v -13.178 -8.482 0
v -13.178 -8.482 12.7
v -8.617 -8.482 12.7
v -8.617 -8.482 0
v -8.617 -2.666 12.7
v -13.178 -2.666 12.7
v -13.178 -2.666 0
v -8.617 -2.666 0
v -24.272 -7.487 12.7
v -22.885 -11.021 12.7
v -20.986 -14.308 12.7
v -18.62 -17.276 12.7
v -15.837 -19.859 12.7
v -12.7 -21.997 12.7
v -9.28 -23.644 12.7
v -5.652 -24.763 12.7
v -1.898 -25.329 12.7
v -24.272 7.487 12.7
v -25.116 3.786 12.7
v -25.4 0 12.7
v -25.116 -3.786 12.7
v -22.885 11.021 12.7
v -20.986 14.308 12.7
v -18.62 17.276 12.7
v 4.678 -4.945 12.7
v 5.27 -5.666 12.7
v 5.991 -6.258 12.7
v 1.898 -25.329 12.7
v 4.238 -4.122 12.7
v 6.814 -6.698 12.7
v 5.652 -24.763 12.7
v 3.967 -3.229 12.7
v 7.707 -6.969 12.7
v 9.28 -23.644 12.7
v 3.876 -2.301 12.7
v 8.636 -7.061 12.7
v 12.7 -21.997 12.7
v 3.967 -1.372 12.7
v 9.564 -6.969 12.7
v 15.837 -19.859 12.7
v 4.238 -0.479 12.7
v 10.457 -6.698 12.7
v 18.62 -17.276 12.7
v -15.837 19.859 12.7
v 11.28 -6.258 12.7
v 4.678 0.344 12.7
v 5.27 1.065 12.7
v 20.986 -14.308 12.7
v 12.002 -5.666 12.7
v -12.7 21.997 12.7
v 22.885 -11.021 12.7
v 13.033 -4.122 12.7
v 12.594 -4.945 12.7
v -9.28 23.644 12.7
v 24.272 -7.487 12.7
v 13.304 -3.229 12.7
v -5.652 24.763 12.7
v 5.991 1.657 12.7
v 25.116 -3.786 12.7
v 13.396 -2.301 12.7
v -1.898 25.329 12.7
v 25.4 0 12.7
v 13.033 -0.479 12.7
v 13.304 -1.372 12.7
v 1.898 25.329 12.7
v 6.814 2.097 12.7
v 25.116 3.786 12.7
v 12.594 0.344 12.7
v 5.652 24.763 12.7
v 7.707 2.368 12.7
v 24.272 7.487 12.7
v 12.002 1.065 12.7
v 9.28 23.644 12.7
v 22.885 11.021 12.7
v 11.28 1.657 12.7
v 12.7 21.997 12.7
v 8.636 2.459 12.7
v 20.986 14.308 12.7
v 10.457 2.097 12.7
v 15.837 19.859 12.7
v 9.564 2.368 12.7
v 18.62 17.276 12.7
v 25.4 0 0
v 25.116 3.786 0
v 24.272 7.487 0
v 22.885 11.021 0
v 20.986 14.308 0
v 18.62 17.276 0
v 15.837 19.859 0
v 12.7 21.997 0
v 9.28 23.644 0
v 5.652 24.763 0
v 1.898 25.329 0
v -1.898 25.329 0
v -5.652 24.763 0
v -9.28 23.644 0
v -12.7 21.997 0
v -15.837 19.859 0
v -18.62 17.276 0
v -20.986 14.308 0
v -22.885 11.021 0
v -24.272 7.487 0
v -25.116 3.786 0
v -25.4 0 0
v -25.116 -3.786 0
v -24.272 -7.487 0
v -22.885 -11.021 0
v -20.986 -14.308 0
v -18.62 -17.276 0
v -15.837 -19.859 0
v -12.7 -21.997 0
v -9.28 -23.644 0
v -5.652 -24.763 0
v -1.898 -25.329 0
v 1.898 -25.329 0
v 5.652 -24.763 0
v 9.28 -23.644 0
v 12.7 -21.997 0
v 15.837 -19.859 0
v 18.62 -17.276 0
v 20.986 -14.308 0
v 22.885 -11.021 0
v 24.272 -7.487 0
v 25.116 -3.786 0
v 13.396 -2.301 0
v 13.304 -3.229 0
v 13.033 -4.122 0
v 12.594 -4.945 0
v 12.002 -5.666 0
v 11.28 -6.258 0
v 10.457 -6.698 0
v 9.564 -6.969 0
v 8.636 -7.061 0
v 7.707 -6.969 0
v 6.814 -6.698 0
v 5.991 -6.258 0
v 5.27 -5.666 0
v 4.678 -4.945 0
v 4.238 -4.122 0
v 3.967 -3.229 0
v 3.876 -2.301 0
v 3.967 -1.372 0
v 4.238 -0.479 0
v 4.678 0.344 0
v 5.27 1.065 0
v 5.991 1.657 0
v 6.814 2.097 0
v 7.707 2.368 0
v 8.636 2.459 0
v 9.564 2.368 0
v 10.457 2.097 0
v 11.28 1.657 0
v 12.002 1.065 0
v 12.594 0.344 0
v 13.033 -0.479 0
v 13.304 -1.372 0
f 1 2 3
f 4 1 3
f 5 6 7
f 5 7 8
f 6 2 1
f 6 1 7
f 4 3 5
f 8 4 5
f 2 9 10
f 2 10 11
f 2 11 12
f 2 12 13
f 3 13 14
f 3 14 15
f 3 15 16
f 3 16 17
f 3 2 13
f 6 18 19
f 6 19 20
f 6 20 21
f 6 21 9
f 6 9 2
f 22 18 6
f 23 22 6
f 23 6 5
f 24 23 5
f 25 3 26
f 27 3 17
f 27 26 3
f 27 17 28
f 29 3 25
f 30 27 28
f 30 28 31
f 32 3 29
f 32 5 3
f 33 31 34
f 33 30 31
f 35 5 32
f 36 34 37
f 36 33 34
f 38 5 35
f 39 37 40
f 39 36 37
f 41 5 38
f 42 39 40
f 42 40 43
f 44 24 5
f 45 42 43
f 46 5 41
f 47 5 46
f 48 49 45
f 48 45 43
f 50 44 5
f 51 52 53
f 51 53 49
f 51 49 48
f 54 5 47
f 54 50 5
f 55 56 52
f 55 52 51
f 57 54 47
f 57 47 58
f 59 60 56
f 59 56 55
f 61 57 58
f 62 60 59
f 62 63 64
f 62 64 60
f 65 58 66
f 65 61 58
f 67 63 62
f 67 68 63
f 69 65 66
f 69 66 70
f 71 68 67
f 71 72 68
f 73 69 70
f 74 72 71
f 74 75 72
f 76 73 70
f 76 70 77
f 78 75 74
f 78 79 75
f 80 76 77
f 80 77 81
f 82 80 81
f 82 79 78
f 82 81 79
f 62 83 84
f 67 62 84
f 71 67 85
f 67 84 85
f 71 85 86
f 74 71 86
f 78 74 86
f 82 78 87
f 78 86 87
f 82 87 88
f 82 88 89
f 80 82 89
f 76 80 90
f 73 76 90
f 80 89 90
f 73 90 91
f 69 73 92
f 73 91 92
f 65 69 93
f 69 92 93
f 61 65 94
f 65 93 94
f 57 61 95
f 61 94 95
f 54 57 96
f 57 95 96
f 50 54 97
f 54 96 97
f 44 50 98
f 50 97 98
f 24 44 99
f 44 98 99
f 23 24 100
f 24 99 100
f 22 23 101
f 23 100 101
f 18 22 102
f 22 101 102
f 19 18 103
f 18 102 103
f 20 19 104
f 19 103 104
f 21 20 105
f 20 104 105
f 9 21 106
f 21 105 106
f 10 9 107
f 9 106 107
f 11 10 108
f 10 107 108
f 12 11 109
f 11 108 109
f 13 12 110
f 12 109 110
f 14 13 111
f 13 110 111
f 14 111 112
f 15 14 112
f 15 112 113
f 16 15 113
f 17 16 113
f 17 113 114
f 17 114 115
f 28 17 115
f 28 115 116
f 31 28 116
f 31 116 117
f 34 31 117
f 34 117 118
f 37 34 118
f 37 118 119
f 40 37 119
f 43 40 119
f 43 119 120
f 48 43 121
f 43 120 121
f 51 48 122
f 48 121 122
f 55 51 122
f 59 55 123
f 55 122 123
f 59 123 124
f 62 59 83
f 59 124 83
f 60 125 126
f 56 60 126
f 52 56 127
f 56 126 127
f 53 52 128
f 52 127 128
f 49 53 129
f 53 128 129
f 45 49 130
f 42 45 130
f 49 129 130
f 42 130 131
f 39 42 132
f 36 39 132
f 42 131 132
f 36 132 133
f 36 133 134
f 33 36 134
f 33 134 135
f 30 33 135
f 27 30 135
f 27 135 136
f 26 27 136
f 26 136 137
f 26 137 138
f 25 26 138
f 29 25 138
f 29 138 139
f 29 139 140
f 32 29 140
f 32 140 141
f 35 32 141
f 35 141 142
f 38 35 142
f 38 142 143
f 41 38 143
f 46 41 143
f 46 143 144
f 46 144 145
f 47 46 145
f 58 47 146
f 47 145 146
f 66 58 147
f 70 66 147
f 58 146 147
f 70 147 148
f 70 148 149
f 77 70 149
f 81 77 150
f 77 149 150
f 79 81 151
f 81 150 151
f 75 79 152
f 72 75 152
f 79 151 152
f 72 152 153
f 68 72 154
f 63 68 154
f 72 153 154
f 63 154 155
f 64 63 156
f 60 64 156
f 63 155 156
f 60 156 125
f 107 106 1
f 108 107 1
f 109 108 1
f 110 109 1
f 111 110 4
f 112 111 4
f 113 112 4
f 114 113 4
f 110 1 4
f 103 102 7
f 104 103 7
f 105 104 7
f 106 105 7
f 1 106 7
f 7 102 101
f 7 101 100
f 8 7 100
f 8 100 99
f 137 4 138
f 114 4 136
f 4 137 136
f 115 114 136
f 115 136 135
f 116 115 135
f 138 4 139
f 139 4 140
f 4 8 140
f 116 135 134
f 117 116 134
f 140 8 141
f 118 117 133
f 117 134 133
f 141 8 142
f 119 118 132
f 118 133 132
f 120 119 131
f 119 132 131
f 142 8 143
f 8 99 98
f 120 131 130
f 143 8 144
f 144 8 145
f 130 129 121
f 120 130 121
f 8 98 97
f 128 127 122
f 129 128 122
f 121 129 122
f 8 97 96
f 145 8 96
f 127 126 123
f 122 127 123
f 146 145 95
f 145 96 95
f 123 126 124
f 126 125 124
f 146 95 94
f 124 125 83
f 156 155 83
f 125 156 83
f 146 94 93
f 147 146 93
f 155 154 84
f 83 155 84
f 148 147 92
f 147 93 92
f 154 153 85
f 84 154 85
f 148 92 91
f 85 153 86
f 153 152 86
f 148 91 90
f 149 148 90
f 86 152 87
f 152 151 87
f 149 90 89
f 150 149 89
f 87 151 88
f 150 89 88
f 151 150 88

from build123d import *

# Parameters (mm, degrees)
F0_R     = 25.4
F1_DEPTH = 12.7
F2_W     = 4.56177
F2_H     = 5.815812
F3_DEPTH = 12.701
F4_R     = 4.759949
F5_DEPTH = 12.701


with BuildPart() as f1:
    # F0 (on Top) → F1 (new body)
    with BuildSketch(Plane.XY):
        Circle(F0_R)
    extrude(amount=F1_DEPTH)

    # F2 (on face) → F3 (cut, through all)
    with BuildSketch(Plane.XY.offset(12.7)):
        with Locations((-10.897615, -5.573769)):
            Rectangle(F2_W, F2_H)
    extrude(amount=-F3_DEPTH, mode=Mode.SUBTRACT)

    # F4 (on face) → F5 (cut, through all)
    with BuildSketch(Plane(origin=(0, 0, 0), x_dir=(1, 0, 0), z_dir=(0, 0, -1))):
        with Locations((8.635784, 2.300633)):
            Circle(F4_R)
    extrude(amount=-F5_DEPTH, mode=Mode.SUBTRACT)


solid = f1.part
